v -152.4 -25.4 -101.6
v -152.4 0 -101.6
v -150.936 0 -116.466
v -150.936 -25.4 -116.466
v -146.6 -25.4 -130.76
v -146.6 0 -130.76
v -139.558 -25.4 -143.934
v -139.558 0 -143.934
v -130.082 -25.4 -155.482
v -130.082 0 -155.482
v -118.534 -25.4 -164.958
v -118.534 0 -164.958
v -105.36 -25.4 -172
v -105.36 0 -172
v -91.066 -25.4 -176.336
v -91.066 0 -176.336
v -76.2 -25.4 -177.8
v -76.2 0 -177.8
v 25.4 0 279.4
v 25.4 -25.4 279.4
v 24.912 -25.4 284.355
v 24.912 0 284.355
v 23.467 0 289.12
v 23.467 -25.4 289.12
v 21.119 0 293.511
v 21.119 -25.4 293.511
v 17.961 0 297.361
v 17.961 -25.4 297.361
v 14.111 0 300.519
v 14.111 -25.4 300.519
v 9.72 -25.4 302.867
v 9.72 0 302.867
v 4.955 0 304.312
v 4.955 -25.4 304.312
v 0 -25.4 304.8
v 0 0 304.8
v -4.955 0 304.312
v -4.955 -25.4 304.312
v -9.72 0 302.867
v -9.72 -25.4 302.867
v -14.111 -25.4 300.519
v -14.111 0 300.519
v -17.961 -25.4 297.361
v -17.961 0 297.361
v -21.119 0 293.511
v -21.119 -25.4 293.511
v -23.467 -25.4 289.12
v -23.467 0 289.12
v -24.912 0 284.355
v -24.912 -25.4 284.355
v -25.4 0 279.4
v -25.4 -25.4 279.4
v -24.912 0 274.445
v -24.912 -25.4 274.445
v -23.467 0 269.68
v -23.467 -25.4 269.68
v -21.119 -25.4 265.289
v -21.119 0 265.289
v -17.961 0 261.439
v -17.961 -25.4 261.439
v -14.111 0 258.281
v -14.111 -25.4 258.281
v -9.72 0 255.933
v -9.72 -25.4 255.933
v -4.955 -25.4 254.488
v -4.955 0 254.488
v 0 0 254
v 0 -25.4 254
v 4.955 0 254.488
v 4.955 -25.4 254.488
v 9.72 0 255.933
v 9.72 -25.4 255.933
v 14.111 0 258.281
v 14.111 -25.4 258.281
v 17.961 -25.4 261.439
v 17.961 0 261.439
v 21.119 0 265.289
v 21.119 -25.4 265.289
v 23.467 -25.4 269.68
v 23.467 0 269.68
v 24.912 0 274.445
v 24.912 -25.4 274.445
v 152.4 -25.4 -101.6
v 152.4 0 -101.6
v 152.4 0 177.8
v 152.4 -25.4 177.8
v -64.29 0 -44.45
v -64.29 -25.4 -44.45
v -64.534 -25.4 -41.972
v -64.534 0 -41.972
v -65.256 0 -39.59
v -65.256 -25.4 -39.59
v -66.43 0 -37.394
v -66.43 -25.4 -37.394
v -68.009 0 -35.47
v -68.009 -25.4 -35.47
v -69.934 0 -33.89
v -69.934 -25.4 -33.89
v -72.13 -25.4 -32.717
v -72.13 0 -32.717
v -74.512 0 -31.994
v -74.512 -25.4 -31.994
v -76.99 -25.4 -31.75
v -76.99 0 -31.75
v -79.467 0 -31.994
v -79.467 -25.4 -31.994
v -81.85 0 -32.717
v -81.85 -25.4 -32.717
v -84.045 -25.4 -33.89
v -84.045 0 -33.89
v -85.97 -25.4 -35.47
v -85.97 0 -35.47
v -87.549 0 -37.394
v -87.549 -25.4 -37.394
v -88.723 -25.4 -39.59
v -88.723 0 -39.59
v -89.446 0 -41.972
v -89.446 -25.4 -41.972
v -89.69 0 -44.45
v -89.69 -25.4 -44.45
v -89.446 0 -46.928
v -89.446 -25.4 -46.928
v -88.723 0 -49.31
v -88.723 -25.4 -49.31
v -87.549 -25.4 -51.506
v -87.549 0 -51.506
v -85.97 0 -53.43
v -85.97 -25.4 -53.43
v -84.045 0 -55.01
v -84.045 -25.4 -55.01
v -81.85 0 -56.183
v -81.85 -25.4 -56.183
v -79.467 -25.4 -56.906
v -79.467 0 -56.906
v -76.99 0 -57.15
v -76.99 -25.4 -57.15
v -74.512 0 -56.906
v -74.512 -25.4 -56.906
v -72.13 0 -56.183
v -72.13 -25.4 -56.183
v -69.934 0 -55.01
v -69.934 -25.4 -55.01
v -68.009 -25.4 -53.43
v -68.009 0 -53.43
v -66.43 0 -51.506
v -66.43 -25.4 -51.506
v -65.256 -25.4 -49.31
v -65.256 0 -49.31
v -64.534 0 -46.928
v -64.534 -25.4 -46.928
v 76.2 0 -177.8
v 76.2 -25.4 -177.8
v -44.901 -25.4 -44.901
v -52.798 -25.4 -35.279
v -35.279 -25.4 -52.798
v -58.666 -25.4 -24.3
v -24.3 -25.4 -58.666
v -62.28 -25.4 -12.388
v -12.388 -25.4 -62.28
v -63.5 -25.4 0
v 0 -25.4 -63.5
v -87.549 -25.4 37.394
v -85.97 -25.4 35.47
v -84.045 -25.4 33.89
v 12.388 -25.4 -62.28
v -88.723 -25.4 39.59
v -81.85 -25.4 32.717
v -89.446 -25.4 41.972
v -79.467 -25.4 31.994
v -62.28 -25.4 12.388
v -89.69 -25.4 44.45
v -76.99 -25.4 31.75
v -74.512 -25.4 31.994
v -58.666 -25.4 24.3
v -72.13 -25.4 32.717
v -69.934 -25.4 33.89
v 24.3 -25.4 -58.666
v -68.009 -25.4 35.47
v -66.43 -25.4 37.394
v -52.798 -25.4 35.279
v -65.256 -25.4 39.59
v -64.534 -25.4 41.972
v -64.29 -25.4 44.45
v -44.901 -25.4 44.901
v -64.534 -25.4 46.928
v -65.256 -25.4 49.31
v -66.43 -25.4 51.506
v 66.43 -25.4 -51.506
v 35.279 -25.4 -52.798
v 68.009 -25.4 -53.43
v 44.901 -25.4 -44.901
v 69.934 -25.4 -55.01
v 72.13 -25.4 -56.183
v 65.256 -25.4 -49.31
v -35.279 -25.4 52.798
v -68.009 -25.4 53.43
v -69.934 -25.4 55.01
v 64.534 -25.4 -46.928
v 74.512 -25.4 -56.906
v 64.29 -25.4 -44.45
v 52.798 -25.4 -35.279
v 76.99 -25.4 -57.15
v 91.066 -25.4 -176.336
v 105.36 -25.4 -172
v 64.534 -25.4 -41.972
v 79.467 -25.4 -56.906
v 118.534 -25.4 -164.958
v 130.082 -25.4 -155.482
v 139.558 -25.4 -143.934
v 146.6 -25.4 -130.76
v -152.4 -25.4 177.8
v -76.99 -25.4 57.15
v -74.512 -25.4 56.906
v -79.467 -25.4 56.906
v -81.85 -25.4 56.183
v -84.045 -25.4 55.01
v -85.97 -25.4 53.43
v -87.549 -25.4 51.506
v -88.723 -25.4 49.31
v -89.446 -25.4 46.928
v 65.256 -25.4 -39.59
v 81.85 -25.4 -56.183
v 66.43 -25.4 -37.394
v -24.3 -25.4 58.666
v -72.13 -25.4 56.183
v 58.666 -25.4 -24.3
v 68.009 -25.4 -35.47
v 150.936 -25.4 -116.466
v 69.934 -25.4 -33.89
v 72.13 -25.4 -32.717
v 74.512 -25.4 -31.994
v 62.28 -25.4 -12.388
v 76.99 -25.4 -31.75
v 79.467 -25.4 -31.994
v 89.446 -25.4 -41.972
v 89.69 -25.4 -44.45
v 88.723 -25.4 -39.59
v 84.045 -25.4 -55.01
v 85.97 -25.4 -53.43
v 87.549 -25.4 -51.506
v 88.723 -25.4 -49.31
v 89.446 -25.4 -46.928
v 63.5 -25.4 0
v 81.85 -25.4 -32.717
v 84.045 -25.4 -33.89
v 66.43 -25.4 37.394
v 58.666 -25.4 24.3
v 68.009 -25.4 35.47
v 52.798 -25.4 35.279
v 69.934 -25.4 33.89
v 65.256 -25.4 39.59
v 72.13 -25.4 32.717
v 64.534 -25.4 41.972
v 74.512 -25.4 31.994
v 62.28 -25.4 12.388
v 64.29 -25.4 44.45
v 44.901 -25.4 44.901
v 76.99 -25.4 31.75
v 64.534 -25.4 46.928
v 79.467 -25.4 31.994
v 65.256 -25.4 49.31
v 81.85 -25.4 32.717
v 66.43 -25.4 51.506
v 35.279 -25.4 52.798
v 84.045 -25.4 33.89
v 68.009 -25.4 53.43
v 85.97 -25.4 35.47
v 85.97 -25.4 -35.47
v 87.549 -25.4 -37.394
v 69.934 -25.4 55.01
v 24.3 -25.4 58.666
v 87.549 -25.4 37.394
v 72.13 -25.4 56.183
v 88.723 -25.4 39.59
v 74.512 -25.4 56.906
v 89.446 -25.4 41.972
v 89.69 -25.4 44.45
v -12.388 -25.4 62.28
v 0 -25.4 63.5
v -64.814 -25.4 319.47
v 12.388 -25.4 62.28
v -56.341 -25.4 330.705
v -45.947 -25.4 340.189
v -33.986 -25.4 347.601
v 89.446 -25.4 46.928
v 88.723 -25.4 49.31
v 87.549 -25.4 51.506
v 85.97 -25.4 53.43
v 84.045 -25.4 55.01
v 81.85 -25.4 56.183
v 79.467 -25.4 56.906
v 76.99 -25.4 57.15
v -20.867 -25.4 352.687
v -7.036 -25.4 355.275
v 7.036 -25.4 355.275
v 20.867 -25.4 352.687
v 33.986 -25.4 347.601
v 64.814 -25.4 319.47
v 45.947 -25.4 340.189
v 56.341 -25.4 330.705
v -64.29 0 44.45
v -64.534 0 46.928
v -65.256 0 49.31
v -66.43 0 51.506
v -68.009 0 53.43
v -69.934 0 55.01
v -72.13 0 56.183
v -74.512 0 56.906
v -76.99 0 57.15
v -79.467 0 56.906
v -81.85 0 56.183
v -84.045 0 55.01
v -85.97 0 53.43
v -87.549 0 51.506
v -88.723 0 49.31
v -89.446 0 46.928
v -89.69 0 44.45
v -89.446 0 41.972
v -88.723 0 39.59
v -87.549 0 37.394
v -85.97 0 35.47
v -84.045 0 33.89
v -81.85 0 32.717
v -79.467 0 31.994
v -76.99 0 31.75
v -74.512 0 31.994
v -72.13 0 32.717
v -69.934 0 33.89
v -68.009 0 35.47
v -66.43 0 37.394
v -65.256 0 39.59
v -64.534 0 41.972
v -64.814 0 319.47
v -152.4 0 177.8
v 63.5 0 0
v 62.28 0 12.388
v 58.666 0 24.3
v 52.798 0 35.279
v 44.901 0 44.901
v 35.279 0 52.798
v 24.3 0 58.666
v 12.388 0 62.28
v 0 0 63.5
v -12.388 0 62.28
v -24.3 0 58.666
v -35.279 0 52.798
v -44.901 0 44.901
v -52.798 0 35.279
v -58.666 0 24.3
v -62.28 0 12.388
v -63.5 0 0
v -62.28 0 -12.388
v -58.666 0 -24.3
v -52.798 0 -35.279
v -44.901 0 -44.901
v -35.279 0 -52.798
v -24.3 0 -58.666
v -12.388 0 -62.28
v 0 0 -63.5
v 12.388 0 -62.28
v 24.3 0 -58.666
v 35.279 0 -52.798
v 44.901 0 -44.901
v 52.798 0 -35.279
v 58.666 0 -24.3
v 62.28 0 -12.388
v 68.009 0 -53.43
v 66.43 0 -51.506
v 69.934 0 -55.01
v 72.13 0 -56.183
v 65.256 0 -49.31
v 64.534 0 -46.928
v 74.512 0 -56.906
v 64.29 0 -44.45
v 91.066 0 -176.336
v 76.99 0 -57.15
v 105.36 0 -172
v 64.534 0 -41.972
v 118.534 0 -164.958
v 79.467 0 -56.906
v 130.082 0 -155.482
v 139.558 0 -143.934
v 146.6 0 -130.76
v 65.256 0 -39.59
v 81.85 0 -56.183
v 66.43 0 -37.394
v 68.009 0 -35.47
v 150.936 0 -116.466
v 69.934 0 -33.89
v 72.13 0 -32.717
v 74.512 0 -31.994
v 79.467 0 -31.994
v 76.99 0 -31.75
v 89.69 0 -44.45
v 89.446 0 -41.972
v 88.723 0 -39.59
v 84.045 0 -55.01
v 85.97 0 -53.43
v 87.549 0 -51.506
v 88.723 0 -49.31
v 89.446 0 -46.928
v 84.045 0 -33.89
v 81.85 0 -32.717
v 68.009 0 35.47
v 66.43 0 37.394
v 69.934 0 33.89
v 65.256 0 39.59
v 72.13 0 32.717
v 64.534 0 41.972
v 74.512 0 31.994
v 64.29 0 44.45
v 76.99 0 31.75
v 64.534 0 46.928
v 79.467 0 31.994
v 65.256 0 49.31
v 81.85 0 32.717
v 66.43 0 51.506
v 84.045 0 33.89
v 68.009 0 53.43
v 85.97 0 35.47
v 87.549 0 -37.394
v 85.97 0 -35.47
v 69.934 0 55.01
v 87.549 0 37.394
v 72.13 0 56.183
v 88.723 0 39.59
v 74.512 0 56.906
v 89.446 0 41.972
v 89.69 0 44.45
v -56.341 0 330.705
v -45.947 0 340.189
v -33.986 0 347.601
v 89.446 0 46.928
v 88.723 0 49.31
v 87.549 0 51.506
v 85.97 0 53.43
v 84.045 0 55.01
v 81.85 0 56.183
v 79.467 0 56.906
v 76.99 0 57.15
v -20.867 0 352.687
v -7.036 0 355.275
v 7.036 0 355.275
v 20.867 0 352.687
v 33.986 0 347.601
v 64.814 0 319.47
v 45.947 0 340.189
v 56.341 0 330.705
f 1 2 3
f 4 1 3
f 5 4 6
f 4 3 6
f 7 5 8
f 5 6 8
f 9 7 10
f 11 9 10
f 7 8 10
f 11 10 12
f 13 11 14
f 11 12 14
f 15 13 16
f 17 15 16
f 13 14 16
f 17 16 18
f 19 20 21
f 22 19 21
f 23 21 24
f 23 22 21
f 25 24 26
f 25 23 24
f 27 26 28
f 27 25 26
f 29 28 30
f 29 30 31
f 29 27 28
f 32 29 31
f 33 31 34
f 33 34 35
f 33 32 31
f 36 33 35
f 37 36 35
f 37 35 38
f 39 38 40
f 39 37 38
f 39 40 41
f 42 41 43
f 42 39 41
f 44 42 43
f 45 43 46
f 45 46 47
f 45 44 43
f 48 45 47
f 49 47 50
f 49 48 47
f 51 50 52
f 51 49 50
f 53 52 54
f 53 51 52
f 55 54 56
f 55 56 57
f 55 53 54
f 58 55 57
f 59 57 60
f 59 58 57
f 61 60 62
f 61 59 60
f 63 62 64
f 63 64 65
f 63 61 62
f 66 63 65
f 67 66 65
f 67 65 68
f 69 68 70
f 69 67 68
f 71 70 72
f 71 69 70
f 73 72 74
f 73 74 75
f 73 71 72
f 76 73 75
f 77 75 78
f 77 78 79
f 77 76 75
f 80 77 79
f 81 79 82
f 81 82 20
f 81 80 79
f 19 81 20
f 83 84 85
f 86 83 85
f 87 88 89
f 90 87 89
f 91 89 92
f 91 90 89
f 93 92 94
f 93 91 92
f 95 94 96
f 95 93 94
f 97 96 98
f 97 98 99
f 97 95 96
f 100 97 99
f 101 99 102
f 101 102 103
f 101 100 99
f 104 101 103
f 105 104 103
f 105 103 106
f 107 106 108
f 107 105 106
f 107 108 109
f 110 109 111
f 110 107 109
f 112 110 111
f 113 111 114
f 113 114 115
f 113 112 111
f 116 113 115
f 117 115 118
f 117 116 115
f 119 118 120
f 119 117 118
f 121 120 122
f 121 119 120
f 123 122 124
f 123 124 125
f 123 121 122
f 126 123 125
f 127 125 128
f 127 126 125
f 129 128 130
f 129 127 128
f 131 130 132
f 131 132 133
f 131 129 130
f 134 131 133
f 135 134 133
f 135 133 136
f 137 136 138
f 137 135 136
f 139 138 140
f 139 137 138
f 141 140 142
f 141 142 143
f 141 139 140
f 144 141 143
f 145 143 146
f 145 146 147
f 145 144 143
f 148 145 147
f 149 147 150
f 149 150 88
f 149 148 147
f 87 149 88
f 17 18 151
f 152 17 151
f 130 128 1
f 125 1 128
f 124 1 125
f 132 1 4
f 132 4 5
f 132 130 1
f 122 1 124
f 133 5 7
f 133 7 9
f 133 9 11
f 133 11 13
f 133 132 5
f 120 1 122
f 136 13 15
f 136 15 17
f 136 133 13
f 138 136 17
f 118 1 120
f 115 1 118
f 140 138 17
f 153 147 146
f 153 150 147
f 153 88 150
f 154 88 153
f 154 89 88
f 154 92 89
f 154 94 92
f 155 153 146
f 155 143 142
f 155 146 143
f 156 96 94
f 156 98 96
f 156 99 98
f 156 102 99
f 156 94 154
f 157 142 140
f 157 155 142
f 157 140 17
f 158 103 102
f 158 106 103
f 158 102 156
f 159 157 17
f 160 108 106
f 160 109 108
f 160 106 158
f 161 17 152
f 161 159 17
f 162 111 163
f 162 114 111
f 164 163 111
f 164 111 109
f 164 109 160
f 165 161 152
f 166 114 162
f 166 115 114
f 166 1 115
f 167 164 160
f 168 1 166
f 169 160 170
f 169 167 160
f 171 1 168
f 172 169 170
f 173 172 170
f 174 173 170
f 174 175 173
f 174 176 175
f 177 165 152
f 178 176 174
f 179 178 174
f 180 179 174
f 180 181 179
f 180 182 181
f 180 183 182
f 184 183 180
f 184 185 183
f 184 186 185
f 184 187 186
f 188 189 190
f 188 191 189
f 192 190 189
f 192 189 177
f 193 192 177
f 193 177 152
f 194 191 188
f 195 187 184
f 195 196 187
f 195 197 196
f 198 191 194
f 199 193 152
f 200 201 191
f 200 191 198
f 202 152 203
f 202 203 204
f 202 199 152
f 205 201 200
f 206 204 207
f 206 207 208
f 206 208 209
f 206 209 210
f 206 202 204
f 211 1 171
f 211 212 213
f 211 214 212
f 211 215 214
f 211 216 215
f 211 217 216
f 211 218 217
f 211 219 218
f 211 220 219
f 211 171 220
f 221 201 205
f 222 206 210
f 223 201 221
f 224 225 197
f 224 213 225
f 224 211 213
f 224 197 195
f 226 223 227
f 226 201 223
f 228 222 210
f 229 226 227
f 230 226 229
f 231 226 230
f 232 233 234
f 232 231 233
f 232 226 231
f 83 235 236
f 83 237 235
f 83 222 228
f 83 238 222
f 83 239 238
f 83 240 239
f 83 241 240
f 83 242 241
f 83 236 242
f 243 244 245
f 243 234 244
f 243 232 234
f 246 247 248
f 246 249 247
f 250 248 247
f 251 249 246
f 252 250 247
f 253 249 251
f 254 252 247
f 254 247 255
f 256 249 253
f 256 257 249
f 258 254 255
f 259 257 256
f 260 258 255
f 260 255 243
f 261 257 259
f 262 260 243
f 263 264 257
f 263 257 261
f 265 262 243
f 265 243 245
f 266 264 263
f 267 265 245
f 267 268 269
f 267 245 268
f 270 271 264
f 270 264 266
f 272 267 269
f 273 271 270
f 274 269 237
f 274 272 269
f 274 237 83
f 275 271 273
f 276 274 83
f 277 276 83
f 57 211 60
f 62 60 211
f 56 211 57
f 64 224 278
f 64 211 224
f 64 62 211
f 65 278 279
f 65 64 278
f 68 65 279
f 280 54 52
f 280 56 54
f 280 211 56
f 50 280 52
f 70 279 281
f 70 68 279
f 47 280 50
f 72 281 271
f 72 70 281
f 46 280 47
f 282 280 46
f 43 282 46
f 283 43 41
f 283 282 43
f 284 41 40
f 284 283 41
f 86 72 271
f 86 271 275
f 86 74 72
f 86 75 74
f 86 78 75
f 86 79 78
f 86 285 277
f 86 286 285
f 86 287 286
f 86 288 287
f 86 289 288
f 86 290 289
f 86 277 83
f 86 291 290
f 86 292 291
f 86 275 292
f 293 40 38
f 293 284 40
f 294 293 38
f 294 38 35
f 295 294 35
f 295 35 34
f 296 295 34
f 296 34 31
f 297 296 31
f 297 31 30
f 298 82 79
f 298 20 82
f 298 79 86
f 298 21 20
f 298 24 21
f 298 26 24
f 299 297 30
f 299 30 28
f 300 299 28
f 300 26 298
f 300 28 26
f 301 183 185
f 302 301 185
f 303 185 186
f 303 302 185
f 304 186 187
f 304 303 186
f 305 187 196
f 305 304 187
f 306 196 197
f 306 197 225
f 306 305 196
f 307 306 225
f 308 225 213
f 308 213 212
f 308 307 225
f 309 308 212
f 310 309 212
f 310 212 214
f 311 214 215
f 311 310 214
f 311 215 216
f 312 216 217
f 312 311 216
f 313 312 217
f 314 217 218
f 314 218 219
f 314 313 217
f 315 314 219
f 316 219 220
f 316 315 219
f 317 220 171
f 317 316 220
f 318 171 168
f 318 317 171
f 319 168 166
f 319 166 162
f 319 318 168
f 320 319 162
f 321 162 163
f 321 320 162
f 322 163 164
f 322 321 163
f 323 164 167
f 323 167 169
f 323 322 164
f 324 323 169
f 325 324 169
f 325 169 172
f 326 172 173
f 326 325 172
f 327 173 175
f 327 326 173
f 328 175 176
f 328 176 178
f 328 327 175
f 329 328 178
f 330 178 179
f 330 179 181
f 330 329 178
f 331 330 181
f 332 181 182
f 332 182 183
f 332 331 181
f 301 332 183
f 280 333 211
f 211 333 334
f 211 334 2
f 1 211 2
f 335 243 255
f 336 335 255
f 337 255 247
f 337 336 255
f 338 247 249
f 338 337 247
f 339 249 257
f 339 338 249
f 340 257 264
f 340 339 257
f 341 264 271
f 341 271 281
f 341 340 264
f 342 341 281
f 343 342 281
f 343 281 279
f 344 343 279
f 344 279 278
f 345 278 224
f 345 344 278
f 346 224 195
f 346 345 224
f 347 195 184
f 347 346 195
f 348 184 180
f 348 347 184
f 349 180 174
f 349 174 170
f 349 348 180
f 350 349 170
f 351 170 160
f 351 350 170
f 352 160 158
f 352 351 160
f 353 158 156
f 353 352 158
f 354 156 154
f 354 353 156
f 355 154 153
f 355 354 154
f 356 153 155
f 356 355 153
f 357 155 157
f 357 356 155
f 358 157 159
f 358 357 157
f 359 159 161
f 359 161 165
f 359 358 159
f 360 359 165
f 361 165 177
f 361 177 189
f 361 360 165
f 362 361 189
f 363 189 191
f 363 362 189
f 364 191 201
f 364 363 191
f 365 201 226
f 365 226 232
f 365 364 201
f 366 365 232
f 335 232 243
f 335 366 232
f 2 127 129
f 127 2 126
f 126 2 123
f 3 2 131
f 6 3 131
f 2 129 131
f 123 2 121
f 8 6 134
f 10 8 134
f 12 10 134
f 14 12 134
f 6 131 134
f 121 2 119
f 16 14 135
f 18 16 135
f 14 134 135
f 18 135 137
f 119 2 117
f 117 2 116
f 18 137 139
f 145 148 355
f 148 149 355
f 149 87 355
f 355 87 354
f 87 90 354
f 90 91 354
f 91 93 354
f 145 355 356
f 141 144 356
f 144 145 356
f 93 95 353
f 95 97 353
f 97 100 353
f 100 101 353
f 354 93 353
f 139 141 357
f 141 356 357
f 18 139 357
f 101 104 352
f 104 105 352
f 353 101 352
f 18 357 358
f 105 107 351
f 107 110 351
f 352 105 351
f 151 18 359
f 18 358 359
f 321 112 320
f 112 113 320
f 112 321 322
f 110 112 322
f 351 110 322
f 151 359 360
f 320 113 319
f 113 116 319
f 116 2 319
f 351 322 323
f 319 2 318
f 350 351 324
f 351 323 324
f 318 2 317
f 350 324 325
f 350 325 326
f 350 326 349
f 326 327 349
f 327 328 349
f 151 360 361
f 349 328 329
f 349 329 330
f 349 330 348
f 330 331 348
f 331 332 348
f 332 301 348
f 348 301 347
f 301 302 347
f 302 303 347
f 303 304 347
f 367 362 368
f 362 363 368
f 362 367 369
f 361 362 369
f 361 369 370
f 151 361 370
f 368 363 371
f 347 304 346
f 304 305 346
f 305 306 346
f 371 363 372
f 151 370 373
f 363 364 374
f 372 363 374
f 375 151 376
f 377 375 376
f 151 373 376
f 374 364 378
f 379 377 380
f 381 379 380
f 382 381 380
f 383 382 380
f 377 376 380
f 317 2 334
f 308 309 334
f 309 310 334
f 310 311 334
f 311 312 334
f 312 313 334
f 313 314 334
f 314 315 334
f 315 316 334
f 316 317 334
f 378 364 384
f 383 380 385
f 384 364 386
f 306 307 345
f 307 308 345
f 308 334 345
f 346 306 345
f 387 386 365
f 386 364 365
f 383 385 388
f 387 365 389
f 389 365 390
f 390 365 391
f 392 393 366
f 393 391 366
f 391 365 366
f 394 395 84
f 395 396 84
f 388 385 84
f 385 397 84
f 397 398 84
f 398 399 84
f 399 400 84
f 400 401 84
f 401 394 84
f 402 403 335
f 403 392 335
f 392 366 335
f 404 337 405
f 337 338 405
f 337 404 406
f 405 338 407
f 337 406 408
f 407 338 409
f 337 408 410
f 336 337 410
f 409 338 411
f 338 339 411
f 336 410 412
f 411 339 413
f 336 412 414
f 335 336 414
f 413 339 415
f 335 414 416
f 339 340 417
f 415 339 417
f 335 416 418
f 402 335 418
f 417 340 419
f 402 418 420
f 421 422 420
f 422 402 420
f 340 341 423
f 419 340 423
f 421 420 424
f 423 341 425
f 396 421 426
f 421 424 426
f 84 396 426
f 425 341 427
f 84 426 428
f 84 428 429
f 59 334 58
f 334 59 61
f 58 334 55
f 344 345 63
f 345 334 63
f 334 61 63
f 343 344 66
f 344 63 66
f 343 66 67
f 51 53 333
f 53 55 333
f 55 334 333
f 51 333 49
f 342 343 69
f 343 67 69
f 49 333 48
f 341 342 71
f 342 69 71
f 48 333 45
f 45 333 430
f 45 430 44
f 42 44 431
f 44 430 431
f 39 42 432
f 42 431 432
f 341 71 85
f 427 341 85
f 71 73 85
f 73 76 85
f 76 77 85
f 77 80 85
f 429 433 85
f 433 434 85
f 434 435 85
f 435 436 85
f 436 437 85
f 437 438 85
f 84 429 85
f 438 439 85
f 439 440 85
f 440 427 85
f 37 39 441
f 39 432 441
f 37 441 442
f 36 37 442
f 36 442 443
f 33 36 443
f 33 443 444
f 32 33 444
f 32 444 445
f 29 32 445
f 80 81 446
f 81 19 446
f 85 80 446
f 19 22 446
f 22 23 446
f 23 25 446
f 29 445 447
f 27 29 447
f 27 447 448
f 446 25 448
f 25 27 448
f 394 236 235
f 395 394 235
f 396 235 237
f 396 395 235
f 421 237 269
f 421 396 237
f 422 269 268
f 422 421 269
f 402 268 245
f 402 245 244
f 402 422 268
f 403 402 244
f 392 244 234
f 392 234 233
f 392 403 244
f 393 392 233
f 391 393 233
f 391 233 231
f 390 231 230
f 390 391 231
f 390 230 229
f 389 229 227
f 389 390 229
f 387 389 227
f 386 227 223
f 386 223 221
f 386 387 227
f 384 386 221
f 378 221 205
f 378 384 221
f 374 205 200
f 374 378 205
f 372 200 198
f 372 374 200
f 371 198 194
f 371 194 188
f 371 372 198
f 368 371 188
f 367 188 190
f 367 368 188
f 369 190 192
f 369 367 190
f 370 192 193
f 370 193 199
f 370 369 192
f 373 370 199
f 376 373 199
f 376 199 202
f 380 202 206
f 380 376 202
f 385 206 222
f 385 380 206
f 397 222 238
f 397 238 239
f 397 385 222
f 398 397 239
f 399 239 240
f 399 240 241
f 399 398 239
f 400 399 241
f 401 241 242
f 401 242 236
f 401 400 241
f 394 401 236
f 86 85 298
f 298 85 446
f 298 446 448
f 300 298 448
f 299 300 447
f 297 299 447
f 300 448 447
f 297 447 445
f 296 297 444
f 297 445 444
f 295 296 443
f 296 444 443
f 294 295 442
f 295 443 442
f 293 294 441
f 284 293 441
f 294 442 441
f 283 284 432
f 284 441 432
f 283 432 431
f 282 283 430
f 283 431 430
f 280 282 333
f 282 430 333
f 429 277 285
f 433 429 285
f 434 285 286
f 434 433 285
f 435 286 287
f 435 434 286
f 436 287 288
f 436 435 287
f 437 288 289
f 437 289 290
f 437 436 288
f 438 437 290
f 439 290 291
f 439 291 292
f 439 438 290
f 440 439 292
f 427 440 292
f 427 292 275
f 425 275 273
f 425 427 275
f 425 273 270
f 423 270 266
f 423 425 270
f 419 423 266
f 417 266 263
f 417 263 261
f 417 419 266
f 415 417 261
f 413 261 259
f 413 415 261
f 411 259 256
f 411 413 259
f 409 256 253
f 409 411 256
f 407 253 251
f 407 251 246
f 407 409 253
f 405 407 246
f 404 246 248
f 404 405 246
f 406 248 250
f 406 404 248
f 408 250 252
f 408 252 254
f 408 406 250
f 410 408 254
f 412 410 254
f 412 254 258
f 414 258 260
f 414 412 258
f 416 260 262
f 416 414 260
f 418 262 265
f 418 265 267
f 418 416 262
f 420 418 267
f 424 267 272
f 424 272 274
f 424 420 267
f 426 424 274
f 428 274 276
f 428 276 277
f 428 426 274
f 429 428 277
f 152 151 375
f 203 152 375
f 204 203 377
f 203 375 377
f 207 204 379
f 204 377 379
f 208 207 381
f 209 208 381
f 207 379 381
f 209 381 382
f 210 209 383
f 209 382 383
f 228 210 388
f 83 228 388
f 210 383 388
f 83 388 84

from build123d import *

# Parameters (mm, degrees)
F0_R     = 12.7
F0_R_2   = 63.5
F0_R_3   = 25.4
F1_DEPTH = 25.4


with BuildPart() as f1:
    # F0 (on Front) → F1 (new body)
    with BuildSketch(Plane.XZ):
        with BuildLine():
            Line((-64.813601, 319.470402), (-152.4, 177.8))
            Line((-152.4, 177.8), (-152.4, -101.6))
            ThreePointArc((-152.4, -101.6), (-130.081537, -155.481537), (-76.2, -177.8))
            Line((-76.2, -177.8), (76.2, -177.8))
            ThreePointArc((76.2, -177.8), (130.081537, -155.481537), (152.4, -101.6))
            Line((152.4, -101.6), (152.4, 177.8))
            Line((152.4, 177.8), (64.813601, 319.470402))
            ThreePointArc((64.813601, 319.470402), (0, 355.6), (-64.813601, 319.470402))
        make_face()
        with Locations((-76.989658, -44.45)):
            Circle(F0_R, mode=Mode.SUBTRACT)
        with Locations((-76.989658, 44.45)):
            Circle(F0_R, mode=Mode.SUBTRACT)
        Circle(F0_R_2, mode=Mode.SUBTRACT)
        with Locations((76.989658, -44.45)):
            Circle(F0_R, mode=Mode.SUBTRACT)
        with Locations((76.989658, 44.45)):
            Circle(F0_R, mode=Mode.SUBTRACT)
        with Locations((0, 279.4)):
            Circle(F0_R_3, mode=Mode.SUBTRACT)
    extrude(amount=F1_DEPTH)


solid = f1.part
